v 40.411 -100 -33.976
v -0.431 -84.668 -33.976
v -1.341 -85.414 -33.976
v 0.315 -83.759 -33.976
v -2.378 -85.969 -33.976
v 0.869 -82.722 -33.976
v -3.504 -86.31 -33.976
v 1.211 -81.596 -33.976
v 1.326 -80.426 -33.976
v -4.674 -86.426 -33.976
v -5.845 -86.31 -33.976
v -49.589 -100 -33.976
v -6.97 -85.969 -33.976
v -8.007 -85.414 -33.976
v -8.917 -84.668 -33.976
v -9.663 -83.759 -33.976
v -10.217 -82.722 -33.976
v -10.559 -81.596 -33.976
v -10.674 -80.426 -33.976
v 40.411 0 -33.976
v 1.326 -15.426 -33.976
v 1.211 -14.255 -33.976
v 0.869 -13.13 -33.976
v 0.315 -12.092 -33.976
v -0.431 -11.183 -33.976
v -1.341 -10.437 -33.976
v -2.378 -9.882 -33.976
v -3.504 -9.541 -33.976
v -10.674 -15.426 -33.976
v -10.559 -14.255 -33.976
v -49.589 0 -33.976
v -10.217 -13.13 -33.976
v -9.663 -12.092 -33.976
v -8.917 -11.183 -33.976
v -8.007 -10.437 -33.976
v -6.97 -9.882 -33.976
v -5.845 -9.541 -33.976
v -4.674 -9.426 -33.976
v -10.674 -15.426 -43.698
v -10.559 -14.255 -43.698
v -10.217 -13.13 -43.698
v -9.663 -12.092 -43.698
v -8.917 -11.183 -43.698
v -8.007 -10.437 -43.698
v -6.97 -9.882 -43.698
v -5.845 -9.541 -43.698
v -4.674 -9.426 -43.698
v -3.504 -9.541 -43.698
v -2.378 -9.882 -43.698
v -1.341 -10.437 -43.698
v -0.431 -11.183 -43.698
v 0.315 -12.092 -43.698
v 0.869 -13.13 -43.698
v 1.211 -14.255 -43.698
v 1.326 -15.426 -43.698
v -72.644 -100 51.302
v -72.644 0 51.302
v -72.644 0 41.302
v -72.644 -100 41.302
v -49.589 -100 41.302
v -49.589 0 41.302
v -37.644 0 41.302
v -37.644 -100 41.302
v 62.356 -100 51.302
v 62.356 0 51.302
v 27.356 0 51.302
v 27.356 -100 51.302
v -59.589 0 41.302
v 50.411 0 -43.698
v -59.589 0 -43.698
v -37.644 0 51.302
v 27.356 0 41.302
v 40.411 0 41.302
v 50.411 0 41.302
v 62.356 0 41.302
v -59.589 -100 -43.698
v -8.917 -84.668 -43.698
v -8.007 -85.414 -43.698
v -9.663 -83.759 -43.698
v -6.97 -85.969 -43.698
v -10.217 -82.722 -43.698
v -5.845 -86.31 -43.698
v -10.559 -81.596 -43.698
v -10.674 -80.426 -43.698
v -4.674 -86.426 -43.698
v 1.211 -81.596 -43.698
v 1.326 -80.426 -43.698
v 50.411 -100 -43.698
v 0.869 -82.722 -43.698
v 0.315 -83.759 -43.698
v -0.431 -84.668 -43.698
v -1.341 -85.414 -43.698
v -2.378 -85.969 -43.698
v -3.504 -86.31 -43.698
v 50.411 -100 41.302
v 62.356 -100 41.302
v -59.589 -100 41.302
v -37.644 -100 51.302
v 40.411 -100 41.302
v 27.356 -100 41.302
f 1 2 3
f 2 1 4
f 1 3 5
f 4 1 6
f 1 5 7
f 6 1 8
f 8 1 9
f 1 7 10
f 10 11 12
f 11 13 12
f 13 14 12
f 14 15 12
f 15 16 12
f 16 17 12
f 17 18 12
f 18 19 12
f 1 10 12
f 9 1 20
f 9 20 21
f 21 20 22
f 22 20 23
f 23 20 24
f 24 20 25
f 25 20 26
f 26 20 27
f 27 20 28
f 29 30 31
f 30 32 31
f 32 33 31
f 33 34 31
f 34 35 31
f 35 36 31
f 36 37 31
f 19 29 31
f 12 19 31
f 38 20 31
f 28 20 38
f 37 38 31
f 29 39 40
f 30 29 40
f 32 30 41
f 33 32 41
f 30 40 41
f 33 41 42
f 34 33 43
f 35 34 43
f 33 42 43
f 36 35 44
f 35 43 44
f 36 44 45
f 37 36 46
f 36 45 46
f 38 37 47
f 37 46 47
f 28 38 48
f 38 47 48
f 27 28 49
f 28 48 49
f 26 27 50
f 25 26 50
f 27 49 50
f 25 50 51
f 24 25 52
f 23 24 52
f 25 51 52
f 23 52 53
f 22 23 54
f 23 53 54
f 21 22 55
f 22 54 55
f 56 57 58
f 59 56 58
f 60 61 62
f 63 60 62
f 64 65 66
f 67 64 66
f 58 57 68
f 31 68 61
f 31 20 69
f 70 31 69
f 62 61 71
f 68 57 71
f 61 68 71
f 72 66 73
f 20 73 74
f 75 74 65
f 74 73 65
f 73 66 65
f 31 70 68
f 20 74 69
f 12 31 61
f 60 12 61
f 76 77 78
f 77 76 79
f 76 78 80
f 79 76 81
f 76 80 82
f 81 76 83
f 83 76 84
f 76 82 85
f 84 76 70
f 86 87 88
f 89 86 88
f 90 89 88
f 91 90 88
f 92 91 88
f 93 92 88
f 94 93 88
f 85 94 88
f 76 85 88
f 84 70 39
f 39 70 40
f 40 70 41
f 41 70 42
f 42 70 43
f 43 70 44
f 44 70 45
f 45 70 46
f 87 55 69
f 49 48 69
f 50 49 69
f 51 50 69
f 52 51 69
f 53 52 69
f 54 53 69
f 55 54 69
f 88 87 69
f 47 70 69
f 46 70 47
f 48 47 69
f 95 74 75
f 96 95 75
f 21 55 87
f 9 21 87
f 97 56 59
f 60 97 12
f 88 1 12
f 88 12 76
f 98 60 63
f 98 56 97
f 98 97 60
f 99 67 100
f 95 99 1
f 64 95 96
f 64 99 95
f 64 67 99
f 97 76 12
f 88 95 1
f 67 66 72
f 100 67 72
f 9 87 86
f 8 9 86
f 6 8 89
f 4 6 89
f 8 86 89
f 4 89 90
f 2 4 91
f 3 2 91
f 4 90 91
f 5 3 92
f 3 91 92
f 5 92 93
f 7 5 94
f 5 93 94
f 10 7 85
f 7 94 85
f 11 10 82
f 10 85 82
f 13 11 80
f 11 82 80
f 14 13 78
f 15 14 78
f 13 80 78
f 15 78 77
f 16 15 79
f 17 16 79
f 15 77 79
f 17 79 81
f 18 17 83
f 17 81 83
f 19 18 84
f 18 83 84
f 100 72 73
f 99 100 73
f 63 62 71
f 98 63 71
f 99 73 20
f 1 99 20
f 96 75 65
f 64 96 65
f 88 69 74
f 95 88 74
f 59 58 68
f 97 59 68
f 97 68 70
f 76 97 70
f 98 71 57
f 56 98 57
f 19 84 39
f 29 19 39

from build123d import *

# Parameters (mm, degrees)
F1_DEPTH = 100
F3_DEPTH = 29


with BuildPart() as f1:
    # F0 (on Front) → F1 (new body)
    with BuildSketch(Plane.XZ):
        Polygon((-59.58884, 51.302213), (-72.644392, 51.302213), (-72.644392, 41.302213), (-59.58884, 41.302213), (-59.58884, -33.975578), (-59.58884, -43.697798), (-49.58884, -43.697798), (40.41116, -43.697798), (50.41116, -43.697798), (50.41116, -33.975578), (50.41116, 41.302213), (62.355608, 41.302213), (62.355608, 51.302213), (50.41116, 51.302213), (40.41116, 51.302213), (27.355608, 51.302213), (27.355608, 41.302213), (40.41116, 41.302213), (40.41116, -33.975578), (-49.58884, -33.975578), (-49.58884, 41.302213), (-37.644392, 41.302213), (-37.644392, 51.302213), (-49.58884, 51.302213), align=None)
    extrude(amount=F1_DEPTH)

    # F2 (on face) → F3 (cut)
    with BuildSketch(Plane(origin=(0, 0, -43.697798), x_dir=(1, 0, 0), z_dir=(0, 0, -1))):
        with BuildLine():
            ThreePointArc((1.325937, 80.42562), (-4.674063, 86.42562), (-10.674063, 80.42562))
            Line((-10.674063, 80.42562), (-10.674063, 15.42562))
            ThreePointArc((-10.674063, 15.42562), (-4.674063, 9.42562), (1.325937, 15.42562))
            Line((1.325937, 15.42562), (1.325937, 80.42562))
        make_face()
    extrude(amount=-F3_DEPTH, mode=Mode.SUBTRACT)


solid = f1.part
